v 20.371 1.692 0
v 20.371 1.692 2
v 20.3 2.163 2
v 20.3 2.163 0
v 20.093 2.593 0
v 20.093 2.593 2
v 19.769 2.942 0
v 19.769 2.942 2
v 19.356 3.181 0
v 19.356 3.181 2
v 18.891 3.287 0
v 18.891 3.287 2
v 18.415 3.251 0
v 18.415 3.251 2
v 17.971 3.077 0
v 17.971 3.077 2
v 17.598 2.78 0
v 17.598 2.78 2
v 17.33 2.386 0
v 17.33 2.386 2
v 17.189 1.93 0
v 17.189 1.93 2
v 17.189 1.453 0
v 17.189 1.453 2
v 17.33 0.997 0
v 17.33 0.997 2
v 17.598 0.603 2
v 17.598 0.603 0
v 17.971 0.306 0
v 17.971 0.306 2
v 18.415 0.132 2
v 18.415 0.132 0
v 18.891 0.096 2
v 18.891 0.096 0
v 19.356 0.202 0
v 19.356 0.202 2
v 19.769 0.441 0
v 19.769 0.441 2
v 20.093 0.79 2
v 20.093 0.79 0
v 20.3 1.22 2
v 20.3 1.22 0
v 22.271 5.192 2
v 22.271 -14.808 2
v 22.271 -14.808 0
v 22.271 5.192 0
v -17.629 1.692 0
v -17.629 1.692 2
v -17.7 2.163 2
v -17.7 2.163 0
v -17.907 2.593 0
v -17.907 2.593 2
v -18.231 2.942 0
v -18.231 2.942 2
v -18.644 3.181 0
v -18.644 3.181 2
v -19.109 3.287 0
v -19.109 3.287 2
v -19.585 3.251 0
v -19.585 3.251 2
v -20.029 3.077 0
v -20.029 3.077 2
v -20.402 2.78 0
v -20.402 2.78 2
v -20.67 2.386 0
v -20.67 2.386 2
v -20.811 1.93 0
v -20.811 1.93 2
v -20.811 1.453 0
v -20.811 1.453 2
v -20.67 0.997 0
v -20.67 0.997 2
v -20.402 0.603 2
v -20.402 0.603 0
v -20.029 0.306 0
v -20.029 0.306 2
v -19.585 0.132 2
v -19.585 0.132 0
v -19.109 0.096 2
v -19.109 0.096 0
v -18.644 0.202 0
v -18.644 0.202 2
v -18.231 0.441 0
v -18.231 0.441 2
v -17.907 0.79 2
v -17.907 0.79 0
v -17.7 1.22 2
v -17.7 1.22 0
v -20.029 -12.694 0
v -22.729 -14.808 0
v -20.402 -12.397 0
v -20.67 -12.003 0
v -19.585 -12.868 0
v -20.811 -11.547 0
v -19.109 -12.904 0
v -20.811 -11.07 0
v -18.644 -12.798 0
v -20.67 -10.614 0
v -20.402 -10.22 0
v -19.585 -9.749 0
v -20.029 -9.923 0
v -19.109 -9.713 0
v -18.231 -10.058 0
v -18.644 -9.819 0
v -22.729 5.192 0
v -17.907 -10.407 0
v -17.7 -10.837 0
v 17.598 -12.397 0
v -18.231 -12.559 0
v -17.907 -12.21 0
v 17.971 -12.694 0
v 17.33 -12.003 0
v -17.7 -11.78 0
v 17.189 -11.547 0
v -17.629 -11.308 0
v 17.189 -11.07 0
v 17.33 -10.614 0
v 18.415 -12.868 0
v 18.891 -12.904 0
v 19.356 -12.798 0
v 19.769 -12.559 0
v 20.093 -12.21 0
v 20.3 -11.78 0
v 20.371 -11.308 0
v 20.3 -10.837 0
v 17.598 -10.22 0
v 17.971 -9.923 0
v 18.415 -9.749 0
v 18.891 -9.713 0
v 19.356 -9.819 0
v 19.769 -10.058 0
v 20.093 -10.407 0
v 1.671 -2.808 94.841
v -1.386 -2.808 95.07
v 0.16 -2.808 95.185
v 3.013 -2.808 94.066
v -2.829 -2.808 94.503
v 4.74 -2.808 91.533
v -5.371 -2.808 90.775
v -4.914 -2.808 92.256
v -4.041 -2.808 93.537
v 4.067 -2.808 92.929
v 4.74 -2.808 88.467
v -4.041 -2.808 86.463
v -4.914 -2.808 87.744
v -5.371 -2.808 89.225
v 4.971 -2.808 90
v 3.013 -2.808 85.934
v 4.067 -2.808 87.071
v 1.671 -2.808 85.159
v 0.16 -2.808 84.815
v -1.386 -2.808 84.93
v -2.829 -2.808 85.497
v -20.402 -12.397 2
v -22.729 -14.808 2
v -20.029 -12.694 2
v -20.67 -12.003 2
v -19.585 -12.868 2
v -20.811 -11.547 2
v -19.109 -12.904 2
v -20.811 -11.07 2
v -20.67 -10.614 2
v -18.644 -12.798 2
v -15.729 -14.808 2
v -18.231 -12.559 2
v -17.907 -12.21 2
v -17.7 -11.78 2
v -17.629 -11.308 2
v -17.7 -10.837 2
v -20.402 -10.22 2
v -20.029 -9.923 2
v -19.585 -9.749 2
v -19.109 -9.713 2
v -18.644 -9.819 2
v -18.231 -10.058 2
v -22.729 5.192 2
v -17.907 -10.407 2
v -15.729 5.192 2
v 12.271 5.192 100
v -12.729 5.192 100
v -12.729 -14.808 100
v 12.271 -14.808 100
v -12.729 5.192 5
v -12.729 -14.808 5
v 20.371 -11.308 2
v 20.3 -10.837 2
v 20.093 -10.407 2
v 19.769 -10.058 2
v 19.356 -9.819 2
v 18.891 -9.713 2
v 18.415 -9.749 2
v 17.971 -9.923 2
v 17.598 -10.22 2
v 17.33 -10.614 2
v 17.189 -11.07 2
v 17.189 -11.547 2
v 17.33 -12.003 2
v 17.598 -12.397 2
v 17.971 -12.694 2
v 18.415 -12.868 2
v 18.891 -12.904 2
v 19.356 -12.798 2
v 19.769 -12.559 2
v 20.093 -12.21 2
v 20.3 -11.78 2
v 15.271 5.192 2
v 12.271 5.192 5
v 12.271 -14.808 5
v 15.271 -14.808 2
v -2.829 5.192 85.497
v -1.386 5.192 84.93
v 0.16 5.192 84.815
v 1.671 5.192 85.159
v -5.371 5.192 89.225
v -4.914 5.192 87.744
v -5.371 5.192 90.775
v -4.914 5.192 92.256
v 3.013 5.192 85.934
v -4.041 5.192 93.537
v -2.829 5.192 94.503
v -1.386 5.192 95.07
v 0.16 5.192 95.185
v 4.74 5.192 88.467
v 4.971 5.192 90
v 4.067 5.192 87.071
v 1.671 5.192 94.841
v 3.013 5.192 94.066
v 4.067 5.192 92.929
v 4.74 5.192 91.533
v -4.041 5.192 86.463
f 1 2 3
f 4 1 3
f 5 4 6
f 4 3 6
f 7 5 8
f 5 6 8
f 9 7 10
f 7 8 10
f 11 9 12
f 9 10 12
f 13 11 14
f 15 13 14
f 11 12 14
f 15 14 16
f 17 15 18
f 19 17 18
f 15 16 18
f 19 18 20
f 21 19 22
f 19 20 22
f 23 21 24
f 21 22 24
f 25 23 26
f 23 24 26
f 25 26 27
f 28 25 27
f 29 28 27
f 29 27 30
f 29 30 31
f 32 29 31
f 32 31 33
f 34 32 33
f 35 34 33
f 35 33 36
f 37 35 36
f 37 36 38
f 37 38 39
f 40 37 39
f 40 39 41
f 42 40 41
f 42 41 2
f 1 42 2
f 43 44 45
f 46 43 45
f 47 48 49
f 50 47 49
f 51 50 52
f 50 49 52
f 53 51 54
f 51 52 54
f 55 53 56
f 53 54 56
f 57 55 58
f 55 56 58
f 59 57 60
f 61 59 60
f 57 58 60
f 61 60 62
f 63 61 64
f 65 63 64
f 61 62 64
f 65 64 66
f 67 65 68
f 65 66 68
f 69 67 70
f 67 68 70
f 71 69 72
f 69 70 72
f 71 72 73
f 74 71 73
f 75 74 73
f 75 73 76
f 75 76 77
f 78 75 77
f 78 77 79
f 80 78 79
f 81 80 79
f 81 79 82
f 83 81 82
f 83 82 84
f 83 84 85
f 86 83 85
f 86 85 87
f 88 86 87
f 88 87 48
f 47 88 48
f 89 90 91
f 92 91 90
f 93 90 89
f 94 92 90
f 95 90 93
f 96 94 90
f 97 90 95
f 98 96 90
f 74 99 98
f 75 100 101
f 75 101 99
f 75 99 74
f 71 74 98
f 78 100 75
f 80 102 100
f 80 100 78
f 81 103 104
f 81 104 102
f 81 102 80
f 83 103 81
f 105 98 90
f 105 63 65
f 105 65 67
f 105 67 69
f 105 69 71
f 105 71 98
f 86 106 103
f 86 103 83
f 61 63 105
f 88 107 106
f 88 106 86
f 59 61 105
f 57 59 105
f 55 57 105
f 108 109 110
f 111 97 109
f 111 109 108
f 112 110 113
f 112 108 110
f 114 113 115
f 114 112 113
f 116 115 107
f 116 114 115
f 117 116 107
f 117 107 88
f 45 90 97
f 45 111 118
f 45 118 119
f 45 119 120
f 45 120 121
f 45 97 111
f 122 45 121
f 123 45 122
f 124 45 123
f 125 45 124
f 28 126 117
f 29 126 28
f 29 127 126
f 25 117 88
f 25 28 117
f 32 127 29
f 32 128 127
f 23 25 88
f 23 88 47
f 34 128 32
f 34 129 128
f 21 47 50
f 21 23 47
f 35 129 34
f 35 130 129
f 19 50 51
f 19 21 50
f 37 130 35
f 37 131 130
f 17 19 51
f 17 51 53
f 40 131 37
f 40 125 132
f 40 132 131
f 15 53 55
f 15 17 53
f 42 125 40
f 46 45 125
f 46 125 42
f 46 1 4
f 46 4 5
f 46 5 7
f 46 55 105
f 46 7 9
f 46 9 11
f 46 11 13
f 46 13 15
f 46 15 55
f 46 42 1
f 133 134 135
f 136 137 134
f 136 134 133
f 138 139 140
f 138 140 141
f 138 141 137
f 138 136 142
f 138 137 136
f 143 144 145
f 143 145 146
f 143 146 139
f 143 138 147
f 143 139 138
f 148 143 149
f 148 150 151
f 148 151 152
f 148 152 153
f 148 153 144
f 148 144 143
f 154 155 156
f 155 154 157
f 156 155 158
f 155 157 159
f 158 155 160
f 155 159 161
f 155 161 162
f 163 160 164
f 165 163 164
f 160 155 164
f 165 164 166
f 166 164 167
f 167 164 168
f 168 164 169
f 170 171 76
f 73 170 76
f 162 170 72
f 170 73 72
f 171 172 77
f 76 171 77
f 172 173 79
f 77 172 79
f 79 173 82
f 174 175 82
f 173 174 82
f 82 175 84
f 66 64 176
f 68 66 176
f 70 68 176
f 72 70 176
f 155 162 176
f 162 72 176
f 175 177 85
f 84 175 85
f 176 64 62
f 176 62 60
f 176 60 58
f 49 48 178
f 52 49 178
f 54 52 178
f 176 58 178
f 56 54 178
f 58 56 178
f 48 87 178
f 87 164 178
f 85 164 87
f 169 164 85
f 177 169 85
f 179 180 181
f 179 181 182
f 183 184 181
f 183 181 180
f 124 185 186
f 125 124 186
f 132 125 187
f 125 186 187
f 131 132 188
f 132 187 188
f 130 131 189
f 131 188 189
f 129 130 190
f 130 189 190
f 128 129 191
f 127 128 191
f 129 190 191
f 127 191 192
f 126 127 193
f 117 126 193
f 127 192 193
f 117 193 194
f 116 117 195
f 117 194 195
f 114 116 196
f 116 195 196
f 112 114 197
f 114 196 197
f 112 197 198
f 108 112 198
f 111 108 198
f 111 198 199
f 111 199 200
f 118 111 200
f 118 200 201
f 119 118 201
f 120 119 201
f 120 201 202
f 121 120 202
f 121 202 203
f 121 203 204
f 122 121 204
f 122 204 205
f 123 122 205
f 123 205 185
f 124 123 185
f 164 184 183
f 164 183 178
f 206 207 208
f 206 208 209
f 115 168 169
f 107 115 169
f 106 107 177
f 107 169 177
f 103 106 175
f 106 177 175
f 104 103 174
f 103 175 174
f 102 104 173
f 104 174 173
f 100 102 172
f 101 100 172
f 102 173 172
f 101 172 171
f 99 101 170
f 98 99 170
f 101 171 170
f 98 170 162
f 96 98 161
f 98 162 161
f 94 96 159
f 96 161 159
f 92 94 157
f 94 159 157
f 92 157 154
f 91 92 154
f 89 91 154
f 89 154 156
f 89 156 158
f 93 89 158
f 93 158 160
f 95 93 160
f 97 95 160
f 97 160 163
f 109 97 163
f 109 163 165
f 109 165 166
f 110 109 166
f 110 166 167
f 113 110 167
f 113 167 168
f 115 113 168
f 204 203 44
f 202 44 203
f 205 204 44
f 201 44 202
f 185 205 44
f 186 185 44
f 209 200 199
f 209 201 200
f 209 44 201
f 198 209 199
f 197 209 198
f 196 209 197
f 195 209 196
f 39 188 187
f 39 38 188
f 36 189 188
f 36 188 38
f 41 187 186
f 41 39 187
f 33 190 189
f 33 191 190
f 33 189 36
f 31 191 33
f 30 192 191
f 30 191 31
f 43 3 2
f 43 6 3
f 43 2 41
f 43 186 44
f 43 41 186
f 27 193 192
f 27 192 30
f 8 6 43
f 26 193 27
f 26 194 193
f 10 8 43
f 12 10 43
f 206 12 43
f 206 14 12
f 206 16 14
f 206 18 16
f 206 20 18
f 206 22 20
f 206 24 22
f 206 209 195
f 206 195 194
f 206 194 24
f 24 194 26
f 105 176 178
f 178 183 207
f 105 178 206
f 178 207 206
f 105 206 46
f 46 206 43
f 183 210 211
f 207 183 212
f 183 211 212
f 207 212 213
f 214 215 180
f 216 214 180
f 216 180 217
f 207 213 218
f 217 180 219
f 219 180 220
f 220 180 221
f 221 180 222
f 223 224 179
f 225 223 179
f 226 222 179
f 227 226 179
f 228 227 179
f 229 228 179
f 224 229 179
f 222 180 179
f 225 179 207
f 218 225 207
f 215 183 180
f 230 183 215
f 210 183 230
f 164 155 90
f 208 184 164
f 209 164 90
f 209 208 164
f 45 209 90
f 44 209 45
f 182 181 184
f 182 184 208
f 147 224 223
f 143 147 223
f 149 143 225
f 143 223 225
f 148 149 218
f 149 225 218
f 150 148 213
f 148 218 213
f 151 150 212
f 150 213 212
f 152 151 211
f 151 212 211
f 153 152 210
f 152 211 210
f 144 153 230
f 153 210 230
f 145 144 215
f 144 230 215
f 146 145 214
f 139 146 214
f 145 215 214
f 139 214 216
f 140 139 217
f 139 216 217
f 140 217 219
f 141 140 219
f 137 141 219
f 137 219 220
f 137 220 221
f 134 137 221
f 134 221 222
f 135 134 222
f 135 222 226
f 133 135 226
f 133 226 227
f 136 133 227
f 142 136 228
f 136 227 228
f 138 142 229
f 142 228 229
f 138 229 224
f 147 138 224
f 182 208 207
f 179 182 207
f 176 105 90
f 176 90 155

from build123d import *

# Parameters (mm, degrees)
SKETCH_1_W          = 25
SKETCH_1_H          = 20
EXTRUDE_1_DEPTH     = 100
SKETCH_2_R          = 5.2
CUT_EXTRUDE_1_DEPTH = 8
SKETCH_3_W          = 2
SKETCH_3_H          = 20
EXTRUDE_2_DEPTH     = 10
EXTRUDE_3_DEPTH     = 20
SKETCH_6_R          = 1.6
CUT_EXTRUDE_2_DEPTH = 3
SKETCH_7_W          = 2
SKETCH_7_H          = 20
EXTRUDE_4_DEPTH     = 10
EXTRUDE_5_DEPTH     = 20
SKETCH_9_R          = 1.6
CUT_EXTRUDE_3_DEPTH = 3


with BuildPart() as part:
    # ｽｹｯﾁ1 → ﾎﾞｽ - 押し出し1 (new body)
    with BuildSketch(Plane.XY):
        with Locations((-0.22894462, -4.808467742)):
            Rectangle(SKETCH_1_W, SKETCH_1_H)
    extrude(amount=EXTRUDE_1_DEPTH)

    # ｽｹｯﾁ2 → ｶｯﾄ - 押し出し1 (cut)
    with BuildSketch(Plane(origin=(0, 5.191532258, 0), x_dir=(1, 0, 0), z_dir=(0, 1, 0))):
        with Locations((-0.22894462, -90)):
            Circle(SKETCH_2_R)
    extrude(amount=-CUT_EXTRUDE_1_DEPTH, mode=Mode.SUBTRACT)

    # ｽｹｯﾁ3 → ﾎﾞｽ - 押し出し2 (add)
    with BuildSketch(Plane(origin=(12.27105538, 0, 0), x_dir=(0, 0, -1), z_dir=(1, 0, 0))):
        with Locations((-1, -4.808467742)):
            Rectangle(SKETCH_3_W, SKETCH_3_H)
    extrude(amount=EXTRUDE_2_DEPTH)

    # ｽｹｯﾁ5 → ﾎﾞｽ - 押し出し3 (add, through all)
    with BuildSketch(Plane(origin=(0, 5.191532258, 0), x_dir=(1, 0, 0), z_dir=(0, 1, 0))):
        Polygon((12.27105538, -5), (15.27105538, -2), (12.27105538, -2), align=None)
    extrude(amount=-EXTRUDE_3_DEPTH)

    # ｽｹｯﾁ6 → ｶｯﾄ - 押し出し2 (cut, through all)
    with BuildSketch(Plane.XY.offset(2)):
        with Locations((18.77105538, 1.691532258)):
            Circle(SKETCH_6_R)
        with Locations((18.77105538, -11.308467742)):
            Circle(SKETCH_6_R)
    extrude(amount=-CUT_EXTRUDE_2_DEPTH, mode=Mode.SUBTRACT)

    # ｽｹｯﾁ7 → ﾎﾞｽ - 押し出し4 (add)
    with BuildSketch(Plane.ZY.offset(12.72894462)):
        with Locations((1, -4.808467742)):
            Rectangle(SKETCH_7_W, SKETCH_7_H)
    extrude(amount=EXTRUDE_4_DEPTH)

    # ｽｹｯﾁ8 → ﾎﾞｽ - 押し出し5 (add, through all)
    with BuildSketch(Plane.XZ.offset(14.808467742)):
        Polygon((-12.72894462, 5), (-15.72894462, 2), (-12.72894462, 2), align=None)
    extrude(amount=-EXTRUDE_5_DEPTH)

    # ｽｹｯﾁ9 → ｶｯﾄ - 押し出し3 (cut, through all)
    with BuildSketch(Plane.XY.offset(2)):
        with Locations((-19.22894462, -11.308467742)):
            Circle(SKETCH_9_R)
        with Locations((-19.22894462, 1.691532258)):
            Circle(SKETCH_9_R)
    extrude(amount=-CUT_EXTRUDE_3_DEPTH, mode=Mode.SUBTRACT)


solid = part.part
